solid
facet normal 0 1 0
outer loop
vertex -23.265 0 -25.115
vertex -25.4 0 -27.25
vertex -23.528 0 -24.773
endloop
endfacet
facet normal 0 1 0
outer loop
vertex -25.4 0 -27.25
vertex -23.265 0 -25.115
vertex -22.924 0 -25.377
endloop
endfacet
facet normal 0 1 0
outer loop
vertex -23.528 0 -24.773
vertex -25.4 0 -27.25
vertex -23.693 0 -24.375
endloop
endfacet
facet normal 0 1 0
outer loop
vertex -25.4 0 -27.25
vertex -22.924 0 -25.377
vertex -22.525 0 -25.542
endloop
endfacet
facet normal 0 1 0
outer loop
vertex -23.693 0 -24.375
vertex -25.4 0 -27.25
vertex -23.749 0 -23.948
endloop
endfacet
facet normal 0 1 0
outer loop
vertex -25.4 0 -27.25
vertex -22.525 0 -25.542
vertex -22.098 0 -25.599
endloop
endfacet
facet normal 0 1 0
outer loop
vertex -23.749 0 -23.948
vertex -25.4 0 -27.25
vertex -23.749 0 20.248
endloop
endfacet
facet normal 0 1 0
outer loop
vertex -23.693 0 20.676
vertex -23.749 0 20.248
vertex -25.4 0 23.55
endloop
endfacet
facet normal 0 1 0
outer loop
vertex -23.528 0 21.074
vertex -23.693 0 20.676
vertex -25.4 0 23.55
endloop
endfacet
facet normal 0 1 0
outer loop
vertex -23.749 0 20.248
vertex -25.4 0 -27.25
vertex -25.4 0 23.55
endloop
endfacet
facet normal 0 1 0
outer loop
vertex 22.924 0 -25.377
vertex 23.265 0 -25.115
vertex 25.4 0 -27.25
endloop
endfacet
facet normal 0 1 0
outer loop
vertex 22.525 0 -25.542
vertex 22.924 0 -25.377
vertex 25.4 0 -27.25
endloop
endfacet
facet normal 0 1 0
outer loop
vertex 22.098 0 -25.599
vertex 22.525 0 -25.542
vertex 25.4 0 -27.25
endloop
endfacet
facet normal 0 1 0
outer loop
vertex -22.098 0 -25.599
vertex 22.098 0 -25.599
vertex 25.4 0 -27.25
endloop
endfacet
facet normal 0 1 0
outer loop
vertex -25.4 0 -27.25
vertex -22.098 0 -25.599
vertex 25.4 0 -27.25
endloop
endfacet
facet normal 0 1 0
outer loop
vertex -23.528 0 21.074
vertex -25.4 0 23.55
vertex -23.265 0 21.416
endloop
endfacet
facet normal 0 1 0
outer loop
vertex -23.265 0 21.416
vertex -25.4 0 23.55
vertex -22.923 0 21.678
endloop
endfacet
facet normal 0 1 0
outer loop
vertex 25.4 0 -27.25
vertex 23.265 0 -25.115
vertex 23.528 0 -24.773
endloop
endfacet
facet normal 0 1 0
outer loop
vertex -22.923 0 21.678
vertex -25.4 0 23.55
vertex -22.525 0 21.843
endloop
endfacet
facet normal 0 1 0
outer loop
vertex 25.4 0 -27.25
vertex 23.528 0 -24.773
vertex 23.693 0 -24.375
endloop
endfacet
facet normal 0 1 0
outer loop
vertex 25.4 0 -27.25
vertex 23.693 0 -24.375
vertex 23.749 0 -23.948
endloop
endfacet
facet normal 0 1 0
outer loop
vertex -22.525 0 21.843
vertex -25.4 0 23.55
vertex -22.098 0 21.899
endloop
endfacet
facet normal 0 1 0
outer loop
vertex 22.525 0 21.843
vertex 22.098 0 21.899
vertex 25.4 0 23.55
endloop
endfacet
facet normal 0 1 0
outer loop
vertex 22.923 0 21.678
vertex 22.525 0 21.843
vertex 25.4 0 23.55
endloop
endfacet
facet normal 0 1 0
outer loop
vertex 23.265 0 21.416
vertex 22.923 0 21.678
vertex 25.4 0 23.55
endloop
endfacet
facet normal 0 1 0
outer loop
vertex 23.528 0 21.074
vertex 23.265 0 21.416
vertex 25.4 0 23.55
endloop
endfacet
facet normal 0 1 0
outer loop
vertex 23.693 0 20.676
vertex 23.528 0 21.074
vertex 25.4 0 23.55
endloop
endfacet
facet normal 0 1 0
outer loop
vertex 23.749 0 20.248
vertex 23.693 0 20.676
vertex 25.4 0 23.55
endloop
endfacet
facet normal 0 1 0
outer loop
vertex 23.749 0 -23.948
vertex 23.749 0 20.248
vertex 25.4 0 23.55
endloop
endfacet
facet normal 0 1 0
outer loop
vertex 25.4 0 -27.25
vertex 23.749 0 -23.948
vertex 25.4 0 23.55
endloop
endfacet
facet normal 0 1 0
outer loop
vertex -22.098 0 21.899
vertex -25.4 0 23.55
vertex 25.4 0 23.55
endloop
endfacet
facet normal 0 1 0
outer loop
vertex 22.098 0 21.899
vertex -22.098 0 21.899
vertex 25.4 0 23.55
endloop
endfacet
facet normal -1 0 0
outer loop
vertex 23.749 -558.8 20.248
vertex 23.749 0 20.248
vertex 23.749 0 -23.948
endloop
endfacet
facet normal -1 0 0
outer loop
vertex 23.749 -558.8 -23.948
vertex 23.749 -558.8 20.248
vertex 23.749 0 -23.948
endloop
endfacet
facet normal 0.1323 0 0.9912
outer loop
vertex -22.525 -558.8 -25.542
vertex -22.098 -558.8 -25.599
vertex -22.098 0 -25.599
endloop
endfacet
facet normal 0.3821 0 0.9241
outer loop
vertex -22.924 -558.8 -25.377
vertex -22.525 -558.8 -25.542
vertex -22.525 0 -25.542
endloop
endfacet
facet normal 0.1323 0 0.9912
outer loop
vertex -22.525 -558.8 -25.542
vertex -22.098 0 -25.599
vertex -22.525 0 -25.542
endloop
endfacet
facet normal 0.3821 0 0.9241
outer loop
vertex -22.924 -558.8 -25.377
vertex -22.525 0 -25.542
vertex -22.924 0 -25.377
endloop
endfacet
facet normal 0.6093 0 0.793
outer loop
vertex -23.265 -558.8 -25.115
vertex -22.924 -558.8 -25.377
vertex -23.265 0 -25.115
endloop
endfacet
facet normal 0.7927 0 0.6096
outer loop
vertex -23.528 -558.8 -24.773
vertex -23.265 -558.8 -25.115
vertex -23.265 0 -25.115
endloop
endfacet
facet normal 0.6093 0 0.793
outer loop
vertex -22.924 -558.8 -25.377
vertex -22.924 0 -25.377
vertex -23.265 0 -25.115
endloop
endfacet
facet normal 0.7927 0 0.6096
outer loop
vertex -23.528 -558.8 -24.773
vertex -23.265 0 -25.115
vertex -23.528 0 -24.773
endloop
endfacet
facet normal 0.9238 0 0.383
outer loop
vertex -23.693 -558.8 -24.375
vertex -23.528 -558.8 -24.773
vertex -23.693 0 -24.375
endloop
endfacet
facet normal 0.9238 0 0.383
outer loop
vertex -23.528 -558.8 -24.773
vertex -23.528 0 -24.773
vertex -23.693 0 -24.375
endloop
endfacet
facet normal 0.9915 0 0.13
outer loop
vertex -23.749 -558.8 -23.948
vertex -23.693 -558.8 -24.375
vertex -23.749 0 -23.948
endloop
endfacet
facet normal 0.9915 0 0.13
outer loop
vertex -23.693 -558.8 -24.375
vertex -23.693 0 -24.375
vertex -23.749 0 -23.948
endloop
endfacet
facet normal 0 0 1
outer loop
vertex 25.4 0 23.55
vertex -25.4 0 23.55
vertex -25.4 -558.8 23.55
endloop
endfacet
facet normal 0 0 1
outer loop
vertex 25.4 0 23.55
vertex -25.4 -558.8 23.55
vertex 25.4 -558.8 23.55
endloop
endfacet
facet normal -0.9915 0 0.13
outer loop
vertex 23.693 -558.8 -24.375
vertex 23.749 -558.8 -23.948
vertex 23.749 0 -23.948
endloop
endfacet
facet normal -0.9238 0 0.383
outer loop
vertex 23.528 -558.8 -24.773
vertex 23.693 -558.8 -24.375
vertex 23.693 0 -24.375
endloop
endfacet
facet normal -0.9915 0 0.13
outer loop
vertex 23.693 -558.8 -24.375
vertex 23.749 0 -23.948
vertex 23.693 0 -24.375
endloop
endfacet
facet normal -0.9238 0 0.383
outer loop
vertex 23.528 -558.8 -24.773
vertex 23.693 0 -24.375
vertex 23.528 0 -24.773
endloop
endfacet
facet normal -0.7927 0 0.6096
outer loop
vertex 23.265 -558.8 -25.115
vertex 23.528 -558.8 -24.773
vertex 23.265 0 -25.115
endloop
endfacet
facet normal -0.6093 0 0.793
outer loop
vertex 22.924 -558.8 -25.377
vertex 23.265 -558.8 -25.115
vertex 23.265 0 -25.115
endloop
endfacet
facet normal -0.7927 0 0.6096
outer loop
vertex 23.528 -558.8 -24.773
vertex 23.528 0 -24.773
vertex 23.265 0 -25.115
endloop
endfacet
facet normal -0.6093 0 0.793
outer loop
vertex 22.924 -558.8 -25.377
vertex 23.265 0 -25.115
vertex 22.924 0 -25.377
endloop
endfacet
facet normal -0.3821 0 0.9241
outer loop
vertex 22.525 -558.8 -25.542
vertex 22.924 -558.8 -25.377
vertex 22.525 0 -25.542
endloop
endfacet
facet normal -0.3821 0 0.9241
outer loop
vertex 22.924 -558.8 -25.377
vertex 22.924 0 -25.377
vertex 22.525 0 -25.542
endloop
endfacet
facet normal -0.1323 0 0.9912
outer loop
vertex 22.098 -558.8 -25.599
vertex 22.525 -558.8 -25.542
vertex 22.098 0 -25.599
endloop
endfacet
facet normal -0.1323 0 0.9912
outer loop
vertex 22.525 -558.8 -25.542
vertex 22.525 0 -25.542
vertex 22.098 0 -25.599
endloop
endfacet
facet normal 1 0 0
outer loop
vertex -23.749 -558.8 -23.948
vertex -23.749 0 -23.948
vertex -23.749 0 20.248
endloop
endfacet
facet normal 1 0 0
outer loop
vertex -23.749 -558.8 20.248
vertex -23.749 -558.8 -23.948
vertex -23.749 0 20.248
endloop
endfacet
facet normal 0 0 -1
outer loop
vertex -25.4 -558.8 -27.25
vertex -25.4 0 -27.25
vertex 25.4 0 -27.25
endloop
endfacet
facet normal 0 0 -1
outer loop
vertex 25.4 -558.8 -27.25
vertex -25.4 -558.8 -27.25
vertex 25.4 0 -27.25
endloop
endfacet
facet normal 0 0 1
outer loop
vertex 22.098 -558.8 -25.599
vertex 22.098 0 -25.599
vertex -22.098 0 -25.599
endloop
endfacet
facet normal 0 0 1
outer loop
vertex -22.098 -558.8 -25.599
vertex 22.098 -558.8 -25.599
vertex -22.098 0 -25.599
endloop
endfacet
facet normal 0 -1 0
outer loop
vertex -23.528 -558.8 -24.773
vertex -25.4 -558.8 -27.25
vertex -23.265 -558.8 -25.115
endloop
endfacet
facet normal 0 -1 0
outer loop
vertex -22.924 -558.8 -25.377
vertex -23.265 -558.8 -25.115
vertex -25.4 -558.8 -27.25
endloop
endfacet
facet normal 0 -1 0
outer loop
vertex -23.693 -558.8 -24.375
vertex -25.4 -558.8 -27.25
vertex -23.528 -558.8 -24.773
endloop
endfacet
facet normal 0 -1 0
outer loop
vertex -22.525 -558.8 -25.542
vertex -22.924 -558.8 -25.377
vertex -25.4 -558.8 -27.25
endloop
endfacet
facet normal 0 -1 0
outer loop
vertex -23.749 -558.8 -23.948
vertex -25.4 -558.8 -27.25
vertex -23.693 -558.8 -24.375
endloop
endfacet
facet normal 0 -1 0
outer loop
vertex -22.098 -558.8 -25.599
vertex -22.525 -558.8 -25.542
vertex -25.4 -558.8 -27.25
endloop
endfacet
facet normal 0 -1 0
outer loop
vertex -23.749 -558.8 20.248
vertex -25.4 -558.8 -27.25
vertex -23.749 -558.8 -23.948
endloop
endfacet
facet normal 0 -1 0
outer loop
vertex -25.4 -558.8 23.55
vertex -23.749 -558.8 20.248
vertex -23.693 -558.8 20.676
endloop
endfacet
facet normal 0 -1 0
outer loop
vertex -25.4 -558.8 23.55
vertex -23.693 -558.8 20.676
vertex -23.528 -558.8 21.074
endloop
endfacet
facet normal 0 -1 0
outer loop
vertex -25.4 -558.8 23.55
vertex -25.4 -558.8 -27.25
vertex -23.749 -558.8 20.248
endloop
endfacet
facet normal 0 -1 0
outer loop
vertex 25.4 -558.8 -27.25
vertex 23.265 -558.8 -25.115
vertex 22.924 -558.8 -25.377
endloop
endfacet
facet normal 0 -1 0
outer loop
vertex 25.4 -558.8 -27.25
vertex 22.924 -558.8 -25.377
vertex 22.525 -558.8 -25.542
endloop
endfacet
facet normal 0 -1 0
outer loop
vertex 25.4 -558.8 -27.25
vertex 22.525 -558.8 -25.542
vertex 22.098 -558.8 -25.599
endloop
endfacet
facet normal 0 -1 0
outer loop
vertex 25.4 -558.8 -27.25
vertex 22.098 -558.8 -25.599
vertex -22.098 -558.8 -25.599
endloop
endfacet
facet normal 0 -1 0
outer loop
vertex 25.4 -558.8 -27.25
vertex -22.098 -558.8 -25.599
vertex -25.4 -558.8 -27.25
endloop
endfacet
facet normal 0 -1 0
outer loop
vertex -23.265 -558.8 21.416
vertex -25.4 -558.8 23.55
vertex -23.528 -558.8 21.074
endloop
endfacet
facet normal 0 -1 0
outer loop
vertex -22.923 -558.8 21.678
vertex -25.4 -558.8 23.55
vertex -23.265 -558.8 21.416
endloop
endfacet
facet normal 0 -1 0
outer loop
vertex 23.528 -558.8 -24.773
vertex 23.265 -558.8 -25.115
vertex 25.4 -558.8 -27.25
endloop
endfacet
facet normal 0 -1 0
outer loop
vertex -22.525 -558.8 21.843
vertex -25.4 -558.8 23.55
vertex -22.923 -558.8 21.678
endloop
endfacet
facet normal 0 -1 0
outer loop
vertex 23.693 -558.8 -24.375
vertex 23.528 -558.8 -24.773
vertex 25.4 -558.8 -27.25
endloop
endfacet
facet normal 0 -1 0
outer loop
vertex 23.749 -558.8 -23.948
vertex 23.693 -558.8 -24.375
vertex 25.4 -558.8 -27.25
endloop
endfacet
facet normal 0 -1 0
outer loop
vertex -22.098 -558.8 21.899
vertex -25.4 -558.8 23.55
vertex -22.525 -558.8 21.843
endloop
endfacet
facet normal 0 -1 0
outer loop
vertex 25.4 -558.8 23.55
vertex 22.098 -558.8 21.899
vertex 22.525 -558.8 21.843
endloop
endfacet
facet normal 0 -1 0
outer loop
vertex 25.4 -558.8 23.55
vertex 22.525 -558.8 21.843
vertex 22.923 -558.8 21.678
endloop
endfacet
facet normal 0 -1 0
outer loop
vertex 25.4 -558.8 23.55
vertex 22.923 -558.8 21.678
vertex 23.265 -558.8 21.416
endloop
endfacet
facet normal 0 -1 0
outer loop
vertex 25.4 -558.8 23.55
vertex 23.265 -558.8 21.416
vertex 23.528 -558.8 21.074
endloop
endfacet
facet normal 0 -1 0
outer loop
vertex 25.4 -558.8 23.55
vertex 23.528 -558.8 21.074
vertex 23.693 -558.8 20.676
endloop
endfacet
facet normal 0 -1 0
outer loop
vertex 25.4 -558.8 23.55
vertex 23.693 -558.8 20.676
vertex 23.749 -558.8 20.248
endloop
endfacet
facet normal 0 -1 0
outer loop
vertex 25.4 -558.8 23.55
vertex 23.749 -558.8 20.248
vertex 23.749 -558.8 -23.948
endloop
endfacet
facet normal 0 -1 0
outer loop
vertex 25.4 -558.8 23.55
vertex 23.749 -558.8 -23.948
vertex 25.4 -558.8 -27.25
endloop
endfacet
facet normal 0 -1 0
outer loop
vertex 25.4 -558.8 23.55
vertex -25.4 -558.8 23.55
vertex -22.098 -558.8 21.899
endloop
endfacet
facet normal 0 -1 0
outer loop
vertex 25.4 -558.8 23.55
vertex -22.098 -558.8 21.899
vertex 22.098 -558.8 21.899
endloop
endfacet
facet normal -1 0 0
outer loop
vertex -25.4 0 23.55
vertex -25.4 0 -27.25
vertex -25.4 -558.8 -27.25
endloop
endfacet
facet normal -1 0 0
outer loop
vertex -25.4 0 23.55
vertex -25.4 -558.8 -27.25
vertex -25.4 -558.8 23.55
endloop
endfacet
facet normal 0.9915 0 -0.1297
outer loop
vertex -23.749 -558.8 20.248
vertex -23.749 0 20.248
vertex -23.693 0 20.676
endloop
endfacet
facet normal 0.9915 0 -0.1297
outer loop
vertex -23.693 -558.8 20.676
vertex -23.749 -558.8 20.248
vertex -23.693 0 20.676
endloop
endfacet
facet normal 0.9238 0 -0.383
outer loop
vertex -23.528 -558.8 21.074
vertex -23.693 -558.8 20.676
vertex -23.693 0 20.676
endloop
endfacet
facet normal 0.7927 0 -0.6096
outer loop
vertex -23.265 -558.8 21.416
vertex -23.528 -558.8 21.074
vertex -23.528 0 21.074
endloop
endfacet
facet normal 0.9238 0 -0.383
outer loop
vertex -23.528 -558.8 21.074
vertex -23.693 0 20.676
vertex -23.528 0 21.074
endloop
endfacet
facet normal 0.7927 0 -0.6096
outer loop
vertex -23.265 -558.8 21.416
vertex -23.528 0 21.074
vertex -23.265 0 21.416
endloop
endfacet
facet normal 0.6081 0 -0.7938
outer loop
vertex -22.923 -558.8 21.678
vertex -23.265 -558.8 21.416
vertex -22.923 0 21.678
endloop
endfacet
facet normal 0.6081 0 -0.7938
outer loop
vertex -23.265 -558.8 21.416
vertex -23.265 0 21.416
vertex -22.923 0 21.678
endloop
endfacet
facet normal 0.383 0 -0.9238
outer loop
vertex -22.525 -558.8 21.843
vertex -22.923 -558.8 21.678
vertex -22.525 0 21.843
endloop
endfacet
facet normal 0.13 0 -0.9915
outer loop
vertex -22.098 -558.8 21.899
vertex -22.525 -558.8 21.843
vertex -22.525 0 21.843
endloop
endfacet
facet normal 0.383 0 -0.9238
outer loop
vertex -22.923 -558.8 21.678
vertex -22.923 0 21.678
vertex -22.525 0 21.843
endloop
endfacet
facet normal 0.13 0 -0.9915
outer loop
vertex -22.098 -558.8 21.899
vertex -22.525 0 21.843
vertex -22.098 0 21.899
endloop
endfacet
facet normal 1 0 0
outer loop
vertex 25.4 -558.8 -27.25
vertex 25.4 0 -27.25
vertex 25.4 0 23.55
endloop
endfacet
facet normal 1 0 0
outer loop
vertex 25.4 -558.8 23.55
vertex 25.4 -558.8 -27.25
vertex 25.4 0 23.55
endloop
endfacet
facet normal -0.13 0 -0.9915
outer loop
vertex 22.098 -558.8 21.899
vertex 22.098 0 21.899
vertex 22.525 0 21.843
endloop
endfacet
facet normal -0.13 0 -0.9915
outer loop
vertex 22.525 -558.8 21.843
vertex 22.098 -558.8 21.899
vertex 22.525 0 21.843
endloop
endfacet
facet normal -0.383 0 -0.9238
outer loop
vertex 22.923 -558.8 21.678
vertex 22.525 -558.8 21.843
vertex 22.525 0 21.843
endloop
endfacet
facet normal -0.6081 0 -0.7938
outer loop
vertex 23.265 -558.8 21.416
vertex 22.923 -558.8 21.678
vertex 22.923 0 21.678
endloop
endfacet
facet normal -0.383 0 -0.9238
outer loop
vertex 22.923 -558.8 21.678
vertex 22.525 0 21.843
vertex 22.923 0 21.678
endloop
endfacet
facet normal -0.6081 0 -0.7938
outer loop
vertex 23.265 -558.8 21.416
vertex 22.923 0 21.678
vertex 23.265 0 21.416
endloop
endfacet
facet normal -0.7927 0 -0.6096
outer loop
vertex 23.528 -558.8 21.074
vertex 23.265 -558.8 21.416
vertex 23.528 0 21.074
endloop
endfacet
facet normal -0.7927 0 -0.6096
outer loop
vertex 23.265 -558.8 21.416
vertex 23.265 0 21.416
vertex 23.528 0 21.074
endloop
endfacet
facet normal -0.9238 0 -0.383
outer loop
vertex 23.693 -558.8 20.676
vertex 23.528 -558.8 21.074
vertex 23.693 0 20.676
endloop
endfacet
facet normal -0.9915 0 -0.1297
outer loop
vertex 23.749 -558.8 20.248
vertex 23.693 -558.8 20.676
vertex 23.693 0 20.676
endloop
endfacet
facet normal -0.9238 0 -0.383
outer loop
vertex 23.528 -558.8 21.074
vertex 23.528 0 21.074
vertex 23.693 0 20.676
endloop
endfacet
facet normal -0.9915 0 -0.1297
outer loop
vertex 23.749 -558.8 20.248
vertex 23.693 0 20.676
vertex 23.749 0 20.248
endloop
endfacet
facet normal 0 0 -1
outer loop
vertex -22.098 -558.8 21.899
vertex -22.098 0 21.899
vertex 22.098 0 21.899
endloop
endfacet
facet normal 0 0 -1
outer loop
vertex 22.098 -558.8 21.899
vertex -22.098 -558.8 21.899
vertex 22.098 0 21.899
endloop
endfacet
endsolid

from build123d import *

# Parameters (mm, degrees)
F0_W     = 50.8
F0_H     = 50.8
F1_DEPTH = 558.8


with BuildPart() as f1:
    # F0 (on Front) → F1 (new body)
    with BuildSketch(Plane.XZ):
        with Locations((0, -1.849517)):
            Rectangle(F0_W, F0_H)
        with BuildLine():
            Line((-22.098, 21.899483), (22.098, 21.899483))
            ThreePointArc((22.098, 21.899483), (23.265433, 21.415916), (23.749, 20.248483))
            Line((23.749, 20.248483), (23.749, -23.947517))
            ThreePointArc((23.749, -23.947517), (23.265433, -25.114951), (22.098, -25.598517))
            Line((22.098, -25.598517), (-22.098, -25.598517))
            ThreePointArc((-22.098, -25.598517), (-23.265433, -25.114951), (-23.749, -23.947517))
            Line((-23.749, -23.947517), (-23.749, 20.248483))
            ThreePointArc((-23.749, 20.248483), (-23.265433, 21.415916), (-22.098, 21.899483))
        make_face(mode=Mode.SUBTRACT)
    extrude(amount=F1_DEPTH)


solid = f1.part
